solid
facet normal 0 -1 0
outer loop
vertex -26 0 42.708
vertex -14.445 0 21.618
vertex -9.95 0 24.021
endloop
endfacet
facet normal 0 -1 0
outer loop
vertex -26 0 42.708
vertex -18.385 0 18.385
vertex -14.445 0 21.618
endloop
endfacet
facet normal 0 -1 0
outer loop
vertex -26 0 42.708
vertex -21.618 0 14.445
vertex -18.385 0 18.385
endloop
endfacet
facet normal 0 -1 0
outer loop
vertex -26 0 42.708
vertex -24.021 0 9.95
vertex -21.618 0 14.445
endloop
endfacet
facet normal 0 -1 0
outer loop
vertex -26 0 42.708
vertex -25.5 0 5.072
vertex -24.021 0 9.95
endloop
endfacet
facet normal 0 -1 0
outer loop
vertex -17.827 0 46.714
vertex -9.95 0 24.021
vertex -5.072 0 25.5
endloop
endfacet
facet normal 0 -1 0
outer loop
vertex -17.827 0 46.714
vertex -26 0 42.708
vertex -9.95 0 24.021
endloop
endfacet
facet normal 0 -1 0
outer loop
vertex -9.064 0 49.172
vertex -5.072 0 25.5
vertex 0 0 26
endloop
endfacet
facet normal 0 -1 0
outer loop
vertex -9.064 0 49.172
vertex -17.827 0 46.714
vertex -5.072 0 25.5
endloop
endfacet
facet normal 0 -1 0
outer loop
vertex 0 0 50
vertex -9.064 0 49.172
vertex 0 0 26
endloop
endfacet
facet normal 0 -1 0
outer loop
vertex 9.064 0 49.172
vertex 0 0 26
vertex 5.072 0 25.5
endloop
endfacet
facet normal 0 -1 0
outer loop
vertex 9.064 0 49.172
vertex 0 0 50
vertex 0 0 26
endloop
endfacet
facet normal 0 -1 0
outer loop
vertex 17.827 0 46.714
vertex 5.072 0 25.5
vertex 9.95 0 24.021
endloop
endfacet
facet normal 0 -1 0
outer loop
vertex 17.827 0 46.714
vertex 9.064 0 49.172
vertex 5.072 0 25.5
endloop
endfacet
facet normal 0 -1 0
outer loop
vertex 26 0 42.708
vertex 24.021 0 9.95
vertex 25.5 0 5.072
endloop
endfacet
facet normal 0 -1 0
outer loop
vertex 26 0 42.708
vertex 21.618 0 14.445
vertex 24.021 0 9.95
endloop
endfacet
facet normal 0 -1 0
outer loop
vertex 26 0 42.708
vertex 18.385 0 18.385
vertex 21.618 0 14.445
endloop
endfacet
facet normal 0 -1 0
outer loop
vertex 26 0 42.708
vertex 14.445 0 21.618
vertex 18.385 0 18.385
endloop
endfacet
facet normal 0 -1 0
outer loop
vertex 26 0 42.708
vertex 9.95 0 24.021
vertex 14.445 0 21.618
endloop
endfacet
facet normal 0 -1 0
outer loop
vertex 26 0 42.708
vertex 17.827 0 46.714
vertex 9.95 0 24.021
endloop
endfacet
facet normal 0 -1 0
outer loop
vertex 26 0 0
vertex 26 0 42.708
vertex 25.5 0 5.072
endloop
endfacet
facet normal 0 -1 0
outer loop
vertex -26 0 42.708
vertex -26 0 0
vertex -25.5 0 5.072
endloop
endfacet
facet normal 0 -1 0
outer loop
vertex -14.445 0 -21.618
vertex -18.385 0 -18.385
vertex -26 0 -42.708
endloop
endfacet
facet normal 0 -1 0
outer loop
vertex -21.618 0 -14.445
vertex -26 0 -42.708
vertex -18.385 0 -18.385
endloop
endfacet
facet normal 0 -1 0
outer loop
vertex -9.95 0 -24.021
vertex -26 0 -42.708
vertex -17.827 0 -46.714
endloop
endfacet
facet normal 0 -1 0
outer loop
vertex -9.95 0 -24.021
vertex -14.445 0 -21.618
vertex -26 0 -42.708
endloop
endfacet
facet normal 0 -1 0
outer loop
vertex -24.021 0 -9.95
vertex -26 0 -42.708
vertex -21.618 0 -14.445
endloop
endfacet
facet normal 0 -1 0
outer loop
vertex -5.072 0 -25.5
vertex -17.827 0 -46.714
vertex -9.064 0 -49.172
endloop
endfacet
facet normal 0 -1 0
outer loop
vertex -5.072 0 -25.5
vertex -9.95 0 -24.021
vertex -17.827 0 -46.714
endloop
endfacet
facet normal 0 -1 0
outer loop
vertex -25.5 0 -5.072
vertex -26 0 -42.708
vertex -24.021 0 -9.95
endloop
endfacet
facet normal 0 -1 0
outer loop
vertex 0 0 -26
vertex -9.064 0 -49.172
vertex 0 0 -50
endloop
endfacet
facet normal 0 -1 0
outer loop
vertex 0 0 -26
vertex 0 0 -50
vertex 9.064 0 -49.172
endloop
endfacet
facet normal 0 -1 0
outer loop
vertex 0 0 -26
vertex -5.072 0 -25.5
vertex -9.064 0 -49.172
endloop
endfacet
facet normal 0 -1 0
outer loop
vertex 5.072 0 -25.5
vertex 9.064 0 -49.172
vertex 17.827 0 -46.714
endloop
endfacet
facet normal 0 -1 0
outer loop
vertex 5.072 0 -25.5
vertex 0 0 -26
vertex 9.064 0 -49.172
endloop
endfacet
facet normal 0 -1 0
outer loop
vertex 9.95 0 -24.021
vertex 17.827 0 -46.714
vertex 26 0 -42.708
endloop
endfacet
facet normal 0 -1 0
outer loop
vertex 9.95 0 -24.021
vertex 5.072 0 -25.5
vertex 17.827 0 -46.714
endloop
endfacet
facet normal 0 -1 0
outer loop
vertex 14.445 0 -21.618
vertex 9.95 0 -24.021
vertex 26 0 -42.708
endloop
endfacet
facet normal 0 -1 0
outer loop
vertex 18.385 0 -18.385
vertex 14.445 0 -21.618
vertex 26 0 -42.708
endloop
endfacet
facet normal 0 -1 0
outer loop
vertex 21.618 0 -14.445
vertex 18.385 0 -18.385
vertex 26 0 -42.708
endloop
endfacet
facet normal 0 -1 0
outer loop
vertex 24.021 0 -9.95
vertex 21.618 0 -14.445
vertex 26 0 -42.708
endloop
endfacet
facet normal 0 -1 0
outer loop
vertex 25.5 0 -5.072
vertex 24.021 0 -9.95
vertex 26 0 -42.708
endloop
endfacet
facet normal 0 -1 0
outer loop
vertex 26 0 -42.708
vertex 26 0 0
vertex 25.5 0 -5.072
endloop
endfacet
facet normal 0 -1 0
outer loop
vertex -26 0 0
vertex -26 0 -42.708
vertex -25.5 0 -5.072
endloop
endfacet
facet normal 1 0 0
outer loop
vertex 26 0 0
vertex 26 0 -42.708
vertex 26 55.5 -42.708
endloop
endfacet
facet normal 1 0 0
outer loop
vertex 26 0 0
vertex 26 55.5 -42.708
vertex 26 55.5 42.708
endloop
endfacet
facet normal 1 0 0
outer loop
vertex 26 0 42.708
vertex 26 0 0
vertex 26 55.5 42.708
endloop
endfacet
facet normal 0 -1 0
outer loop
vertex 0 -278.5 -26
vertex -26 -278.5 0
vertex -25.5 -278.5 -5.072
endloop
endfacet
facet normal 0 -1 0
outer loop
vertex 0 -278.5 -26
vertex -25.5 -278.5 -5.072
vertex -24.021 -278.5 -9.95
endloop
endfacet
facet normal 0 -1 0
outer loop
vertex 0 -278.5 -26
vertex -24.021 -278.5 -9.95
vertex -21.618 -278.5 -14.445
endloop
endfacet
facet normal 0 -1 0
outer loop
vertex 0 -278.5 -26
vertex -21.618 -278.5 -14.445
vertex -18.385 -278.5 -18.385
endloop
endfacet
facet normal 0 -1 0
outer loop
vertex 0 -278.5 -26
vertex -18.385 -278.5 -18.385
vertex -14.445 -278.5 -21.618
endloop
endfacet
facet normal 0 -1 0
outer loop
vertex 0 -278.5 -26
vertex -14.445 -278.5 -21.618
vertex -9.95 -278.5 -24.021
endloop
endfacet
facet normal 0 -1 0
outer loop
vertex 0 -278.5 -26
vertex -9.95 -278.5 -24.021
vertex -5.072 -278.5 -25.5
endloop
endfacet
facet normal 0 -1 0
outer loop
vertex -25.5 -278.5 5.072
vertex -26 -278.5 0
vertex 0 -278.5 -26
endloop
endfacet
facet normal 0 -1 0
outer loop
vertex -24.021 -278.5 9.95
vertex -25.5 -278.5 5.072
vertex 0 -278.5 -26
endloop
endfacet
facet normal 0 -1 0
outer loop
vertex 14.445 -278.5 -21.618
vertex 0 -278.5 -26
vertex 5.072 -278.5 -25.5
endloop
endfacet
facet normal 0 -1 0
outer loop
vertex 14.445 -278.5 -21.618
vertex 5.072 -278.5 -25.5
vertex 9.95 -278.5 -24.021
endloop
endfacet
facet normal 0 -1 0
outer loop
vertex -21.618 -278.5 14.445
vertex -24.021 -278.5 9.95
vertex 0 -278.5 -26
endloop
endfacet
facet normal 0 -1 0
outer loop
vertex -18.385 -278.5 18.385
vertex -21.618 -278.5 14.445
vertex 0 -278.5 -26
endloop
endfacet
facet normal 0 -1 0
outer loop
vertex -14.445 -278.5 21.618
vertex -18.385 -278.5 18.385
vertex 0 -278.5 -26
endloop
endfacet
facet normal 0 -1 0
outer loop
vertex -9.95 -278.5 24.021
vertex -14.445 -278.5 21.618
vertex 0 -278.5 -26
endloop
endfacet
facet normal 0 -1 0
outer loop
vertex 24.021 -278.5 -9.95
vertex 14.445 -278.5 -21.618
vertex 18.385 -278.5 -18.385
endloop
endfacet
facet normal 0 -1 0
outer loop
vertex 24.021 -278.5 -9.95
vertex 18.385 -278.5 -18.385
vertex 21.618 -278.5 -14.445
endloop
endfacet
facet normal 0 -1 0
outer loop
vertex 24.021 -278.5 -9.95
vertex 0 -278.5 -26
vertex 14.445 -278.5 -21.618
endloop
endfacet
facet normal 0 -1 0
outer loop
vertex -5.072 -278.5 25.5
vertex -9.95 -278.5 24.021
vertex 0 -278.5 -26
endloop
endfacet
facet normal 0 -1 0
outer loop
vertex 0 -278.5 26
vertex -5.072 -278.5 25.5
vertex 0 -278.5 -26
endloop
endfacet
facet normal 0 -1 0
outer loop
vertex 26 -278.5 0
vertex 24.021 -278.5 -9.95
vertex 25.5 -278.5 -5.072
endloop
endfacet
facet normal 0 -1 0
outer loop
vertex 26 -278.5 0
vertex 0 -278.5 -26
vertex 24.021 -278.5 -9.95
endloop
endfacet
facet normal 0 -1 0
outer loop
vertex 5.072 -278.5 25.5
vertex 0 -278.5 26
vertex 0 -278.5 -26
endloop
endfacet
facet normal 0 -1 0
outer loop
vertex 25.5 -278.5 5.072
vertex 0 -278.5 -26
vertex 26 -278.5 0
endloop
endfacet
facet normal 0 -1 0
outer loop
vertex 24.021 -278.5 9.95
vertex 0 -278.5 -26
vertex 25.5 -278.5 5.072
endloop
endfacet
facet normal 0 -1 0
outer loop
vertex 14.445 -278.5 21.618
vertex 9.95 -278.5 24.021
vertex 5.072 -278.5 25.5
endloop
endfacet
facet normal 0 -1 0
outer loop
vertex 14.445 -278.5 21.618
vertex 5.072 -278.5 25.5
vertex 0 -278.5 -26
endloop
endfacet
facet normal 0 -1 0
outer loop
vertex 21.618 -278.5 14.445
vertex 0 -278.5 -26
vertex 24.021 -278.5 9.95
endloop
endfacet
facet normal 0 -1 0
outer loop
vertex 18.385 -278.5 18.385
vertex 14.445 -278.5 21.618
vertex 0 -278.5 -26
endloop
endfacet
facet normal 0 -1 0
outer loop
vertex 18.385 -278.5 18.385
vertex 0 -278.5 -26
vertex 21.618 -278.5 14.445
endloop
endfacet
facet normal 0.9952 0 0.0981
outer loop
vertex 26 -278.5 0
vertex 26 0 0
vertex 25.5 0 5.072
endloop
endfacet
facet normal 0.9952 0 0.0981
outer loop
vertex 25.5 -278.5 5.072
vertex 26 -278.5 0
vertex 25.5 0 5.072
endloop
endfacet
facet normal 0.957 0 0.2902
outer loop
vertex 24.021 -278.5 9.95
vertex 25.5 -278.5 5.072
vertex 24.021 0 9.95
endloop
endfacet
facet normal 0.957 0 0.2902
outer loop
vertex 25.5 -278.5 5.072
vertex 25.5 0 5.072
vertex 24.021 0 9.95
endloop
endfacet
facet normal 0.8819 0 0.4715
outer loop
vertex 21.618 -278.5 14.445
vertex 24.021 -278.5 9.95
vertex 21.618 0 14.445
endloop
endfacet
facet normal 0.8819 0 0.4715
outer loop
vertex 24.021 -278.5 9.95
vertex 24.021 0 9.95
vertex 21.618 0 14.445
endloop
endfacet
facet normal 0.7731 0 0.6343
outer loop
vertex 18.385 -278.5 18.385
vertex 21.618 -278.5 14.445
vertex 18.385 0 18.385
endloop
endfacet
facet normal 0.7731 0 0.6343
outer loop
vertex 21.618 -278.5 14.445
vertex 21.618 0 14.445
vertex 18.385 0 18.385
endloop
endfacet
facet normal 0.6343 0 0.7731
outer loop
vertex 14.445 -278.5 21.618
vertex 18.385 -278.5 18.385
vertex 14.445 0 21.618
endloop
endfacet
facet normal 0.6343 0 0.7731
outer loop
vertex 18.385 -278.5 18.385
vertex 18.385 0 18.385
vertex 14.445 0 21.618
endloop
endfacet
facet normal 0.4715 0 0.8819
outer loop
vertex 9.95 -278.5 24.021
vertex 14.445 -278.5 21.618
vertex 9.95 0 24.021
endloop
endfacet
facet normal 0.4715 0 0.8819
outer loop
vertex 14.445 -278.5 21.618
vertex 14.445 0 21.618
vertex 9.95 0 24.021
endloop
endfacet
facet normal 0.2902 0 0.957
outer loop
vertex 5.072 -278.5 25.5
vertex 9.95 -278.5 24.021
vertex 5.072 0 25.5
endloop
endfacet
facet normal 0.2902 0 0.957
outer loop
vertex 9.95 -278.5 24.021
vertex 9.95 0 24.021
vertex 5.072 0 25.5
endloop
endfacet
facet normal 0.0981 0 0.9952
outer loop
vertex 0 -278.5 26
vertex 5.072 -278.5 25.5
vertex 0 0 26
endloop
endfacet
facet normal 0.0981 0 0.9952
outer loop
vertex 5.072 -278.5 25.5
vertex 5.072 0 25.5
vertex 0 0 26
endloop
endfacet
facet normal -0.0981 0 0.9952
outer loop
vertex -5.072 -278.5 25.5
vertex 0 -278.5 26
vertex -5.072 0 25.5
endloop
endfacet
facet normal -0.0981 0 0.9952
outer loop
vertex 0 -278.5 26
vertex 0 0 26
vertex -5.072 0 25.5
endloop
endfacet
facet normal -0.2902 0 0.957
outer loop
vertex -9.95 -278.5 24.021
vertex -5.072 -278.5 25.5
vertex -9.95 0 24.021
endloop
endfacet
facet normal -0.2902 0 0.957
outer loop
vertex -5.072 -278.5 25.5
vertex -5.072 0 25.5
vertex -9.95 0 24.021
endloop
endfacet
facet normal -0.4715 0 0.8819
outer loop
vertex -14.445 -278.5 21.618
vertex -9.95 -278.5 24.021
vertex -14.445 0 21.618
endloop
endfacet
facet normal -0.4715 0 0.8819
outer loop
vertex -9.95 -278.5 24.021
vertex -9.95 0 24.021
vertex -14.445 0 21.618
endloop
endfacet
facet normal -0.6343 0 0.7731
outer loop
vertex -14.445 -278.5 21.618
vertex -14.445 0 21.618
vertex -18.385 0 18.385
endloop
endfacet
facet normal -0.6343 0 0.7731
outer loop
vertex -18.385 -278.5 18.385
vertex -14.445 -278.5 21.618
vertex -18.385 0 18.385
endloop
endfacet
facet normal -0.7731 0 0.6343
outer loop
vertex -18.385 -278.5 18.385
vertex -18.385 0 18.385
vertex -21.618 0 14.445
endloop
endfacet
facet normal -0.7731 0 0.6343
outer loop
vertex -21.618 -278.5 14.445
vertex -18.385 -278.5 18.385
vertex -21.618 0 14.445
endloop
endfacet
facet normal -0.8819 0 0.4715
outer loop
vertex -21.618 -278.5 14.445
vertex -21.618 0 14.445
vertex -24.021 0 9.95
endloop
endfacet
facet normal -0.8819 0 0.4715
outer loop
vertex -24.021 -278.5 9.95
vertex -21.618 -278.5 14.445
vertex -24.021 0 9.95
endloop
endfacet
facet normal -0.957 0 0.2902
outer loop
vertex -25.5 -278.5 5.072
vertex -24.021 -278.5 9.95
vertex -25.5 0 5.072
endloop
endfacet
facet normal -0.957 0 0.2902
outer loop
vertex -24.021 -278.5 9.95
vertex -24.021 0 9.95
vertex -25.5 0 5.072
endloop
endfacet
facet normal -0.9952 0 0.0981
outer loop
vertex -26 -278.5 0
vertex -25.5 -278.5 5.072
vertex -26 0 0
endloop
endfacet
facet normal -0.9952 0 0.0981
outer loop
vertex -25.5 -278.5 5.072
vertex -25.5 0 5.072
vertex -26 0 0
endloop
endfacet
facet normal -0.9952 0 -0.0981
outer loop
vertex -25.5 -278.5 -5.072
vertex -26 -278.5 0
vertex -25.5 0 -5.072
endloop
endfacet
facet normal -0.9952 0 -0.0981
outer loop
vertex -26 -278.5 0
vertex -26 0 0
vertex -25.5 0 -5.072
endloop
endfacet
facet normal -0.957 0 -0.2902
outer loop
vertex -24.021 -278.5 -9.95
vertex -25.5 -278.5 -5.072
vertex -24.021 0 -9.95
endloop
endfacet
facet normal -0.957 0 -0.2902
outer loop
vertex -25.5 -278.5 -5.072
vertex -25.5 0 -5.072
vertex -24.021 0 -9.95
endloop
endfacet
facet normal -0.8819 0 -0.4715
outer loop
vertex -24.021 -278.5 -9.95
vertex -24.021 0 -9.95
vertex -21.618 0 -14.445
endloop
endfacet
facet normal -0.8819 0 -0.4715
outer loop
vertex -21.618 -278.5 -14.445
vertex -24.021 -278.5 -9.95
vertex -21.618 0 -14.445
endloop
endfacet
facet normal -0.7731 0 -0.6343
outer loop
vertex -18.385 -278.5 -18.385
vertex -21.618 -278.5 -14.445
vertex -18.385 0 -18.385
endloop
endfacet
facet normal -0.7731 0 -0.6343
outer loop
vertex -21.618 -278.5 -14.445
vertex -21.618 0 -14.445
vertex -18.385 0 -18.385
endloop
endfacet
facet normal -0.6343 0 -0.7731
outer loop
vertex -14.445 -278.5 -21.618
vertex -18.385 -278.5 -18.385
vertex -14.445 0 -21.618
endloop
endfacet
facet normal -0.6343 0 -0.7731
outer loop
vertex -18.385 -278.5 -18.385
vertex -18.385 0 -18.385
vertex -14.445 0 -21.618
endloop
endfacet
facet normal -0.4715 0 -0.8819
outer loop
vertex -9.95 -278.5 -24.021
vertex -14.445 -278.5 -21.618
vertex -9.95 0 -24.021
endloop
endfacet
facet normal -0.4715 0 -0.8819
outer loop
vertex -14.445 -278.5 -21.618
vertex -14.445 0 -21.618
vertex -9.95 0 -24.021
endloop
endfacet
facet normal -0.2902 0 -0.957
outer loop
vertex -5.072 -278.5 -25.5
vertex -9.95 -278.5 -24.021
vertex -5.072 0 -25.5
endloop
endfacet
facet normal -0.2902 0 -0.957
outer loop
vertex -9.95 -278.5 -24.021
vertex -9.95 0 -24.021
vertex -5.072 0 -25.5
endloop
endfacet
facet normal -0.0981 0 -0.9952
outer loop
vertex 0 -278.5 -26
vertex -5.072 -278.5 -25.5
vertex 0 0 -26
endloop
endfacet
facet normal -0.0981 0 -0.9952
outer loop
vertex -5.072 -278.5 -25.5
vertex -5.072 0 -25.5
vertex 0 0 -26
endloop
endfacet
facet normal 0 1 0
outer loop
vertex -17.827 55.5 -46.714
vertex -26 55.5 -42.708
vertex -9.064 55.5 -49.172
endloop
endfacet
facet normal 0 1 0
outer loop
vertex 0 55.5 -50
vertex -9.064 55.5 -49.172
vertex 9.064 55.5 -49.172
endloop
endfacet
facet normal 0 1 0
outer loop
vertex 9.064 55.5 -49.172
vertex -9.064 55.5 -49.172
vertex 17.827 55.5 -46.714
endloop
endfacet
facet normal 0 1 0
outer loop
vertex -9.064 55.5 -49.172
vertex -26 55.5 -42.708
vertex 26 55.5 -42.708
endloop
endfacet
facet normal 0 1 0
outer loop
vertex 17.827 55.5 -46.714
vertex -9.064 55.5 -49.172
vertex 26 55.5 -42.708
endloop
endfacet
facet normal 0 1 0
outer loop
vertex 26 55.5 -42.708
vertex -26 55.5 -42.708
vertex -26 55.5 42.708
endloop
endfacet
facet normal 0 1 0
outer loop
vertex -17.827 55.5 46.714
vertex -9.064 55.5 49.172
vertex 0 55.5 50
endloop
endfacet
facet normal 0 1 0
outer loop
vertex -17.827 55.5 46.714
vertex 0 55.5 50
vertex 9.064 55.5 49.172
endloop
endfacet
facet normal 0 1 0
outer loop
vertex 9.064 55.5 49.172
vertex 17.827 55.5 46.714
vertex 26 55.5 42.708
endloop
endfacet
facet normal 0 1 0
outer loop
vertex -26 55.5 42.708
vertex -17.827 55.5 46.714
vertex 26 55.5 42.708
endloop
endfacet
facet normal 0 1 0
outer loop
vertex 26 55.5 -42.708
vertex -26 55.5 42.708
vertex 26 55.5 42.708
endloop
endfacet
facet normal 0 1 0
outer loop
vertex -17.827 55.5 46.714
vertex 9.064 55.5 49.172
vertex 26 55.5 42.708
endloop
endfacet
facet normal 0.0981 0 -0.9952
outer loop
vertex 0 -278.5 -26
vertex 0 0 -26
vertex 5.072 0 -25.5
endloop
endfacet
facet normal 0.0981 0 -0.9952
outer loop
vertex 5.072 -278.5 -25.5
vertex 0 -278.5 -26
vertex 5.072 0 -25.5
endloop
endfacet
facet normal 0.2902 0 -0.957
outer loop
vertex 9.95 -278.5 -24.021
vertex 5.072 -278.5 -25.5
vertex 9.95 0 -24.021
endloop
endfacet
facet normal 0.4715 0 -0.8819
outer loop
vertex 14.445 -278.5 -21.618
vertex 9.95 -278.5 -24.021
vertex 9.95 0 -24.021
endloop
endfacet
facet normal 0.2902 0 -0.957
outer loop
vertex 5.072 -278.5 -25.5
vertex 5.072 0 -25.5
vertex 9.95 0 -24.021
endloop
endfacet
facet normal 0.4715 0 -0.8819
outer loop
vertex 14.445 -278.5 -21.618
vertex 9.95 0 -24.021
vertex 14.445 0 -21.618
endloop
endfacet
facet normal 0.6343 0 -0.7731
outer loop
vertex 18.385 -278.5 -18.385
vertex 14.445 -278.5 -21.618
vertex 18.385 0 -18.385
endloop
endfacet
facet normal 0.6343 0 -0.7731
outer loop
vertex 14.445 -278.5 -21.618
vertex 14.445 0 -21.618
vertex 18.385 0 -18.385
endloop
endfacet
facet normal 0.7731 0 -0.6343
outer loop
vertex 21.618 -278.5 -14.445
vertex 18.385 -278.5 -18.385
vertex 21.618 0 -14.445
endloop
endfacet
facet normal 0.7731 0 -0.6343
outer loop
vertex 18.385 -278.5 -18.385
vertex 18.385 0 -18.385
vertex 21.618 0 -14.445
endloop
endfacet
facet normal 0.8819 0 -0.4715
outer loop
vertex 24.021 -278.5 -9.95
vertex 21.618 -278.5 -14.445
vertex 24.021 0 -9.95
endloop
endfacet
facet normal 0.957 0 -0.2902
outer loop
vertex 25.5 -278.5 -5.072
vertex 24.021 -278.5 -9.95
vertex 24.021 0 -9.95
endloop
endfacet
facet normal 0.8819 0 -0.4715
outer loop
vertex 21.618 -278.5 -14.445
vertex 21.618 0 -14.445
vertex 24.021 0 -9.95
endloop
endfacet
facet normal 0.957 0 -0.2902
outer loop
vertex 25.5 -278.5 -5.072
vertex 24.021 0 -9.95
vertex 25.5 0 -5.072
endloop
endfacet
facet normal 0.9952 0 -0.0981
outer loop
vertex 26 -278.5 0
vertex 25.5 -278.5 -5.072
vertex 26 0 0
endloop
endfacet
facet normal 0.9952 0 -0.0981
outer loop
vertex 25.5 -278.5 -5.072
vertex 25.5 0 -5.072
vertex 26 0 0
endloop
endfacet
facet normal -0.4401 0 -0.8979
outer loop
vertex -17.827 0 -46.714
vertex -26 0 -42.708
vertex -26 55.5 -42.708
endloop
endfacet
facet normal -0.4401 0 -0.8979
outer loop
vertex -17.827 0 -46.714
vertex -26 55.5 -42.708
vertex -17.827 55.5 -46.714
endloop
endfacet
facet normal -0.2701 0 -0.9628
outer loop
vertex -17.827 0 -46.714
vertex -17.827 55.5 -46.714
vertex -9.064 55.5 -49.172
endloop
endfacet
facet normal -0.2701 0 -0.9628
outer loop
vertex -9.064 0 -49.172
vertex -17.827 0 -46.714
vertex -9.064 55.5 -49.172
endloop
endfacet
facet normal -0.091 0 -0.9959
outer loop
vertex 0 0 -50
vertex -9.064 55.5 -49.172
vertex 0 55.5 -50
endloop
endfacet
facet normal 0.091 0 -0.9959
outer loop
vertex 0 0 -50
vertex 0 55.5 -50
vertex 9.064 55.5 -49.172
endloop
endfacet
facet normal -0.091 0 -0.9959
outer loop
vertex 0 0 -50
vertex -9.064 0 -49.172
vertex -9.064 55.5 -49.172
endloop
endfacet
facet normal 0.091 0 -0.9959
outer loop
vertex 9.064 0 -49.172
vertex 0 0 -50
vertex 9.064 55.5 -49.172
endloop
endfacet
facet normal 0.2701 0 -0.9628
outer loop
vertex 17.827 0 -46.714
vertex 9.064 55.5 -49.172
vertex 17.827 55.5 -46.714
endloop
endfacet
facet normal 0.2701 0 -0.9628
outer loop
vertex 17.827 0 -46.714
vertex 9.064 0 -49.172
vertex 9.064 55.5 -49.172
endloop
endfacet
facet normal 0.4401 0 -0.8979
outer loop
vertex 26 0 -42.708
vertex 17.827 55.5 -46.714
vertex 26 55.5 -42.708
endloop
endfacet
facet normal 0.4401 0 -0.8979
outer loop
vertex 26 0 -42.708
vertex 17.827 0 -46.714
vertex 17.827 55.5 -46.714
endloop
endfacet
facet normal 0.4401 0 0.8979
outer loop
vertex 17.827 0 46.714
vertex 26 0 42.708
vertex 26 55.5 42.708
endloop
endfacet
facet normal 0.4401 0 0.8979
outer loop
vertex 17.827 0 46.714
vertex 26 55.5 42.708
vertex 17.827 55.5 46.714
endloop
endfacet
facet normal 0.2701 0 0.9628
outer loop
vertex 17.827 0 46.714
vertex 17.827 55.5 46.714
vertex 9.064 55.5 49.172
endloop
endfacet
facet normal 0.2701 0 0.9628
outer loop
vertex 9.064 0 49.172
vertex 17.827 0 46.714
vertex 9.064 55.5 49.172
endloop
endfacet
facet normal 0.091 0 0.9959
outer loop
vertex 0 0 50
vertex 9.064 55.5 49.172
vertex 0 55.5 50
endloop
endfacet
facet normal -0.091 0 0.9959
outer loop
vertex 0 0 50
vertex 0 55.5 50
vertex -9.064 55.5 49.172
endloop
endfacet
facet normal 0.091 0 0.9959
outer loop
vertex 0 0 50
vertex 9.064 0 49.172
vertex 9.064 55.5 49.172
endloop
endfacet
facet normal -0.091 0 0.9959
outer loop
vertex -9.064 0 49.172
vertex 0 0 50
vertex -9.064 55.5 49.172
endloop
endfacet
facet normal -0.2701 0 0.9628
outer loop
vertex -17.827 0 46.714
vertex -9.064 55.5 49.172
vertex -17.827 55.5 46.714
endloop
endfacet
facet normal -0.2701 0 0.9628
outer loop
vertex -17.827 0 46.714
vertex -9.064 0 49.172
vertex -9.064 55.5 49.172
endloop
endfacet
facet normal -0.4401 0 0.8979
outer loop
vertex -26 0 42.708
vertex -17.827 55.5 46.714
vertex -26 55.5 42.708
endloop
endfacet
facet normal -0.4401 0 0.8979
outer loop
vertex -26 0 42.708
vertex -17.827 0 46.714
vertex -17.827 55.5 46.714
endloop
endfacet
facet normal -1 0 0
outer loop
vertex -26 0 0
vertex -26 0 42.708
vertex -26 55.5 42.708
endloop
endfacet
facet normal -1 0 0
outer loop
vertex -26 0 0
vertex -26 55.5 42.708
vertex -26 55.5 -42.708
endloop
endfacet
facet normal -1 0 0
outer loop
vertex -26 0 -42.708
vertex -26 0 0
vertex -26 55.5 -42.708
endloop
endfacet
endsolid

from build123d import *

# Parameters (mm, degrees)
F1_DEPTH = 278.5
F2_DEPTH = 55.5


with BuildPart() as f1:
    # F0 (on Front) → F1 (new body)
    with BuildSketch(Plane.XZ):
        with BuildLine():
            ThreePointArc((-26, -2.27e-08), (-18.3847763028, -18.3847763189), (0, -26))
            ThreePointArc((0, -26), (18.3847763109, -18.3847763109), (26, 0))
            ThreePointArc((26, 0), (18.384776305, 18.3847763167), (-1.64e-08, 26))
            ThreePointArc((-1.64e-08, 26), (-18.3847763247, 18.384776297), (-26, -2.27e-08))
        make_face()
    extrude(amount=F1_DEPTH)

    # F0 (on Front) → F2 (join)
    with BuildSketch(Plane.XZ):
        with BuildLine():
            Line((26, -42.7083130081), (26, -26))
            Line((26, -26), (0, -26))
            Line((0, -26), (-26, -26))
            Line((-26, -26), (-26, -42.7083130081))
            ThreePointArc((-26, -42.7083130081), (0, -50), (26, -42.7083130081))
        make_face()
        with BuildLine():
            Line((0, -26), (26, -26))
            Line((26, -26), (26, 0))
            ThreePointArc((26, 0), (18.3847763109, -18.3847763109), (0, -26))
        make_face()
        with BuildLine():
            Line((-26, -26), (0, -26))
            ThreePointArc((0, -26), (-18.3847763028, -18.3847763189), (-26, -2.27e-08))
            Line((-26, -2.27e-08), (-26, -26))
        make_face()
        with BuildLine():
            ThreePointArc((-26, -2.27e-08), (-18.3847763028, -18.3847763189), (0, -26))
            ThreePointArc((0, -26), (18.3847763109, -18.3847763109), (26, 0))
            ThreePointArc((26, 0), (18.384776305, 18.3847763167), (-1.64e-08, 26))
            ThreePointArc((-1.64e-08, 26), (-18.3847763247, 18.384776297), (-26, -2.27e-08))
        make_face()
        with BuildLine():
            ThreePointArc((-1.64e-08, 26), (18.384776305, 18.3847763167), (26, 0))
            Line((26, 0), (26, 26))
            Line((26, 26), (-1.64e-08, 26))
        make_face()
        with BuildLine():
            Line((-26, 26), (-26, -2.27e-08))
            ThreePointArc((-26, -2.27e-08), (-18.3847763247, 18.384776297), (-1.64e-08, 26))
            Line((-1.64e-08, 26), (-26, 26))
        make_face()
        with BuildLine():
            Line((-1.64e-08, 26), (26, 26))
            Line((26, 26), (26, 42.7083130081))
            ThreePointArc((26, 42.7083130081), (0, 50), (-26, 42.7083130081))
            Line((-26, 42.7083130081), (-26, 26))
            Line((-26, 26), (-1.64e-08, 26))
        make_face()
    extrude(amount=-F2_DEPTH)


solid = f1.part
